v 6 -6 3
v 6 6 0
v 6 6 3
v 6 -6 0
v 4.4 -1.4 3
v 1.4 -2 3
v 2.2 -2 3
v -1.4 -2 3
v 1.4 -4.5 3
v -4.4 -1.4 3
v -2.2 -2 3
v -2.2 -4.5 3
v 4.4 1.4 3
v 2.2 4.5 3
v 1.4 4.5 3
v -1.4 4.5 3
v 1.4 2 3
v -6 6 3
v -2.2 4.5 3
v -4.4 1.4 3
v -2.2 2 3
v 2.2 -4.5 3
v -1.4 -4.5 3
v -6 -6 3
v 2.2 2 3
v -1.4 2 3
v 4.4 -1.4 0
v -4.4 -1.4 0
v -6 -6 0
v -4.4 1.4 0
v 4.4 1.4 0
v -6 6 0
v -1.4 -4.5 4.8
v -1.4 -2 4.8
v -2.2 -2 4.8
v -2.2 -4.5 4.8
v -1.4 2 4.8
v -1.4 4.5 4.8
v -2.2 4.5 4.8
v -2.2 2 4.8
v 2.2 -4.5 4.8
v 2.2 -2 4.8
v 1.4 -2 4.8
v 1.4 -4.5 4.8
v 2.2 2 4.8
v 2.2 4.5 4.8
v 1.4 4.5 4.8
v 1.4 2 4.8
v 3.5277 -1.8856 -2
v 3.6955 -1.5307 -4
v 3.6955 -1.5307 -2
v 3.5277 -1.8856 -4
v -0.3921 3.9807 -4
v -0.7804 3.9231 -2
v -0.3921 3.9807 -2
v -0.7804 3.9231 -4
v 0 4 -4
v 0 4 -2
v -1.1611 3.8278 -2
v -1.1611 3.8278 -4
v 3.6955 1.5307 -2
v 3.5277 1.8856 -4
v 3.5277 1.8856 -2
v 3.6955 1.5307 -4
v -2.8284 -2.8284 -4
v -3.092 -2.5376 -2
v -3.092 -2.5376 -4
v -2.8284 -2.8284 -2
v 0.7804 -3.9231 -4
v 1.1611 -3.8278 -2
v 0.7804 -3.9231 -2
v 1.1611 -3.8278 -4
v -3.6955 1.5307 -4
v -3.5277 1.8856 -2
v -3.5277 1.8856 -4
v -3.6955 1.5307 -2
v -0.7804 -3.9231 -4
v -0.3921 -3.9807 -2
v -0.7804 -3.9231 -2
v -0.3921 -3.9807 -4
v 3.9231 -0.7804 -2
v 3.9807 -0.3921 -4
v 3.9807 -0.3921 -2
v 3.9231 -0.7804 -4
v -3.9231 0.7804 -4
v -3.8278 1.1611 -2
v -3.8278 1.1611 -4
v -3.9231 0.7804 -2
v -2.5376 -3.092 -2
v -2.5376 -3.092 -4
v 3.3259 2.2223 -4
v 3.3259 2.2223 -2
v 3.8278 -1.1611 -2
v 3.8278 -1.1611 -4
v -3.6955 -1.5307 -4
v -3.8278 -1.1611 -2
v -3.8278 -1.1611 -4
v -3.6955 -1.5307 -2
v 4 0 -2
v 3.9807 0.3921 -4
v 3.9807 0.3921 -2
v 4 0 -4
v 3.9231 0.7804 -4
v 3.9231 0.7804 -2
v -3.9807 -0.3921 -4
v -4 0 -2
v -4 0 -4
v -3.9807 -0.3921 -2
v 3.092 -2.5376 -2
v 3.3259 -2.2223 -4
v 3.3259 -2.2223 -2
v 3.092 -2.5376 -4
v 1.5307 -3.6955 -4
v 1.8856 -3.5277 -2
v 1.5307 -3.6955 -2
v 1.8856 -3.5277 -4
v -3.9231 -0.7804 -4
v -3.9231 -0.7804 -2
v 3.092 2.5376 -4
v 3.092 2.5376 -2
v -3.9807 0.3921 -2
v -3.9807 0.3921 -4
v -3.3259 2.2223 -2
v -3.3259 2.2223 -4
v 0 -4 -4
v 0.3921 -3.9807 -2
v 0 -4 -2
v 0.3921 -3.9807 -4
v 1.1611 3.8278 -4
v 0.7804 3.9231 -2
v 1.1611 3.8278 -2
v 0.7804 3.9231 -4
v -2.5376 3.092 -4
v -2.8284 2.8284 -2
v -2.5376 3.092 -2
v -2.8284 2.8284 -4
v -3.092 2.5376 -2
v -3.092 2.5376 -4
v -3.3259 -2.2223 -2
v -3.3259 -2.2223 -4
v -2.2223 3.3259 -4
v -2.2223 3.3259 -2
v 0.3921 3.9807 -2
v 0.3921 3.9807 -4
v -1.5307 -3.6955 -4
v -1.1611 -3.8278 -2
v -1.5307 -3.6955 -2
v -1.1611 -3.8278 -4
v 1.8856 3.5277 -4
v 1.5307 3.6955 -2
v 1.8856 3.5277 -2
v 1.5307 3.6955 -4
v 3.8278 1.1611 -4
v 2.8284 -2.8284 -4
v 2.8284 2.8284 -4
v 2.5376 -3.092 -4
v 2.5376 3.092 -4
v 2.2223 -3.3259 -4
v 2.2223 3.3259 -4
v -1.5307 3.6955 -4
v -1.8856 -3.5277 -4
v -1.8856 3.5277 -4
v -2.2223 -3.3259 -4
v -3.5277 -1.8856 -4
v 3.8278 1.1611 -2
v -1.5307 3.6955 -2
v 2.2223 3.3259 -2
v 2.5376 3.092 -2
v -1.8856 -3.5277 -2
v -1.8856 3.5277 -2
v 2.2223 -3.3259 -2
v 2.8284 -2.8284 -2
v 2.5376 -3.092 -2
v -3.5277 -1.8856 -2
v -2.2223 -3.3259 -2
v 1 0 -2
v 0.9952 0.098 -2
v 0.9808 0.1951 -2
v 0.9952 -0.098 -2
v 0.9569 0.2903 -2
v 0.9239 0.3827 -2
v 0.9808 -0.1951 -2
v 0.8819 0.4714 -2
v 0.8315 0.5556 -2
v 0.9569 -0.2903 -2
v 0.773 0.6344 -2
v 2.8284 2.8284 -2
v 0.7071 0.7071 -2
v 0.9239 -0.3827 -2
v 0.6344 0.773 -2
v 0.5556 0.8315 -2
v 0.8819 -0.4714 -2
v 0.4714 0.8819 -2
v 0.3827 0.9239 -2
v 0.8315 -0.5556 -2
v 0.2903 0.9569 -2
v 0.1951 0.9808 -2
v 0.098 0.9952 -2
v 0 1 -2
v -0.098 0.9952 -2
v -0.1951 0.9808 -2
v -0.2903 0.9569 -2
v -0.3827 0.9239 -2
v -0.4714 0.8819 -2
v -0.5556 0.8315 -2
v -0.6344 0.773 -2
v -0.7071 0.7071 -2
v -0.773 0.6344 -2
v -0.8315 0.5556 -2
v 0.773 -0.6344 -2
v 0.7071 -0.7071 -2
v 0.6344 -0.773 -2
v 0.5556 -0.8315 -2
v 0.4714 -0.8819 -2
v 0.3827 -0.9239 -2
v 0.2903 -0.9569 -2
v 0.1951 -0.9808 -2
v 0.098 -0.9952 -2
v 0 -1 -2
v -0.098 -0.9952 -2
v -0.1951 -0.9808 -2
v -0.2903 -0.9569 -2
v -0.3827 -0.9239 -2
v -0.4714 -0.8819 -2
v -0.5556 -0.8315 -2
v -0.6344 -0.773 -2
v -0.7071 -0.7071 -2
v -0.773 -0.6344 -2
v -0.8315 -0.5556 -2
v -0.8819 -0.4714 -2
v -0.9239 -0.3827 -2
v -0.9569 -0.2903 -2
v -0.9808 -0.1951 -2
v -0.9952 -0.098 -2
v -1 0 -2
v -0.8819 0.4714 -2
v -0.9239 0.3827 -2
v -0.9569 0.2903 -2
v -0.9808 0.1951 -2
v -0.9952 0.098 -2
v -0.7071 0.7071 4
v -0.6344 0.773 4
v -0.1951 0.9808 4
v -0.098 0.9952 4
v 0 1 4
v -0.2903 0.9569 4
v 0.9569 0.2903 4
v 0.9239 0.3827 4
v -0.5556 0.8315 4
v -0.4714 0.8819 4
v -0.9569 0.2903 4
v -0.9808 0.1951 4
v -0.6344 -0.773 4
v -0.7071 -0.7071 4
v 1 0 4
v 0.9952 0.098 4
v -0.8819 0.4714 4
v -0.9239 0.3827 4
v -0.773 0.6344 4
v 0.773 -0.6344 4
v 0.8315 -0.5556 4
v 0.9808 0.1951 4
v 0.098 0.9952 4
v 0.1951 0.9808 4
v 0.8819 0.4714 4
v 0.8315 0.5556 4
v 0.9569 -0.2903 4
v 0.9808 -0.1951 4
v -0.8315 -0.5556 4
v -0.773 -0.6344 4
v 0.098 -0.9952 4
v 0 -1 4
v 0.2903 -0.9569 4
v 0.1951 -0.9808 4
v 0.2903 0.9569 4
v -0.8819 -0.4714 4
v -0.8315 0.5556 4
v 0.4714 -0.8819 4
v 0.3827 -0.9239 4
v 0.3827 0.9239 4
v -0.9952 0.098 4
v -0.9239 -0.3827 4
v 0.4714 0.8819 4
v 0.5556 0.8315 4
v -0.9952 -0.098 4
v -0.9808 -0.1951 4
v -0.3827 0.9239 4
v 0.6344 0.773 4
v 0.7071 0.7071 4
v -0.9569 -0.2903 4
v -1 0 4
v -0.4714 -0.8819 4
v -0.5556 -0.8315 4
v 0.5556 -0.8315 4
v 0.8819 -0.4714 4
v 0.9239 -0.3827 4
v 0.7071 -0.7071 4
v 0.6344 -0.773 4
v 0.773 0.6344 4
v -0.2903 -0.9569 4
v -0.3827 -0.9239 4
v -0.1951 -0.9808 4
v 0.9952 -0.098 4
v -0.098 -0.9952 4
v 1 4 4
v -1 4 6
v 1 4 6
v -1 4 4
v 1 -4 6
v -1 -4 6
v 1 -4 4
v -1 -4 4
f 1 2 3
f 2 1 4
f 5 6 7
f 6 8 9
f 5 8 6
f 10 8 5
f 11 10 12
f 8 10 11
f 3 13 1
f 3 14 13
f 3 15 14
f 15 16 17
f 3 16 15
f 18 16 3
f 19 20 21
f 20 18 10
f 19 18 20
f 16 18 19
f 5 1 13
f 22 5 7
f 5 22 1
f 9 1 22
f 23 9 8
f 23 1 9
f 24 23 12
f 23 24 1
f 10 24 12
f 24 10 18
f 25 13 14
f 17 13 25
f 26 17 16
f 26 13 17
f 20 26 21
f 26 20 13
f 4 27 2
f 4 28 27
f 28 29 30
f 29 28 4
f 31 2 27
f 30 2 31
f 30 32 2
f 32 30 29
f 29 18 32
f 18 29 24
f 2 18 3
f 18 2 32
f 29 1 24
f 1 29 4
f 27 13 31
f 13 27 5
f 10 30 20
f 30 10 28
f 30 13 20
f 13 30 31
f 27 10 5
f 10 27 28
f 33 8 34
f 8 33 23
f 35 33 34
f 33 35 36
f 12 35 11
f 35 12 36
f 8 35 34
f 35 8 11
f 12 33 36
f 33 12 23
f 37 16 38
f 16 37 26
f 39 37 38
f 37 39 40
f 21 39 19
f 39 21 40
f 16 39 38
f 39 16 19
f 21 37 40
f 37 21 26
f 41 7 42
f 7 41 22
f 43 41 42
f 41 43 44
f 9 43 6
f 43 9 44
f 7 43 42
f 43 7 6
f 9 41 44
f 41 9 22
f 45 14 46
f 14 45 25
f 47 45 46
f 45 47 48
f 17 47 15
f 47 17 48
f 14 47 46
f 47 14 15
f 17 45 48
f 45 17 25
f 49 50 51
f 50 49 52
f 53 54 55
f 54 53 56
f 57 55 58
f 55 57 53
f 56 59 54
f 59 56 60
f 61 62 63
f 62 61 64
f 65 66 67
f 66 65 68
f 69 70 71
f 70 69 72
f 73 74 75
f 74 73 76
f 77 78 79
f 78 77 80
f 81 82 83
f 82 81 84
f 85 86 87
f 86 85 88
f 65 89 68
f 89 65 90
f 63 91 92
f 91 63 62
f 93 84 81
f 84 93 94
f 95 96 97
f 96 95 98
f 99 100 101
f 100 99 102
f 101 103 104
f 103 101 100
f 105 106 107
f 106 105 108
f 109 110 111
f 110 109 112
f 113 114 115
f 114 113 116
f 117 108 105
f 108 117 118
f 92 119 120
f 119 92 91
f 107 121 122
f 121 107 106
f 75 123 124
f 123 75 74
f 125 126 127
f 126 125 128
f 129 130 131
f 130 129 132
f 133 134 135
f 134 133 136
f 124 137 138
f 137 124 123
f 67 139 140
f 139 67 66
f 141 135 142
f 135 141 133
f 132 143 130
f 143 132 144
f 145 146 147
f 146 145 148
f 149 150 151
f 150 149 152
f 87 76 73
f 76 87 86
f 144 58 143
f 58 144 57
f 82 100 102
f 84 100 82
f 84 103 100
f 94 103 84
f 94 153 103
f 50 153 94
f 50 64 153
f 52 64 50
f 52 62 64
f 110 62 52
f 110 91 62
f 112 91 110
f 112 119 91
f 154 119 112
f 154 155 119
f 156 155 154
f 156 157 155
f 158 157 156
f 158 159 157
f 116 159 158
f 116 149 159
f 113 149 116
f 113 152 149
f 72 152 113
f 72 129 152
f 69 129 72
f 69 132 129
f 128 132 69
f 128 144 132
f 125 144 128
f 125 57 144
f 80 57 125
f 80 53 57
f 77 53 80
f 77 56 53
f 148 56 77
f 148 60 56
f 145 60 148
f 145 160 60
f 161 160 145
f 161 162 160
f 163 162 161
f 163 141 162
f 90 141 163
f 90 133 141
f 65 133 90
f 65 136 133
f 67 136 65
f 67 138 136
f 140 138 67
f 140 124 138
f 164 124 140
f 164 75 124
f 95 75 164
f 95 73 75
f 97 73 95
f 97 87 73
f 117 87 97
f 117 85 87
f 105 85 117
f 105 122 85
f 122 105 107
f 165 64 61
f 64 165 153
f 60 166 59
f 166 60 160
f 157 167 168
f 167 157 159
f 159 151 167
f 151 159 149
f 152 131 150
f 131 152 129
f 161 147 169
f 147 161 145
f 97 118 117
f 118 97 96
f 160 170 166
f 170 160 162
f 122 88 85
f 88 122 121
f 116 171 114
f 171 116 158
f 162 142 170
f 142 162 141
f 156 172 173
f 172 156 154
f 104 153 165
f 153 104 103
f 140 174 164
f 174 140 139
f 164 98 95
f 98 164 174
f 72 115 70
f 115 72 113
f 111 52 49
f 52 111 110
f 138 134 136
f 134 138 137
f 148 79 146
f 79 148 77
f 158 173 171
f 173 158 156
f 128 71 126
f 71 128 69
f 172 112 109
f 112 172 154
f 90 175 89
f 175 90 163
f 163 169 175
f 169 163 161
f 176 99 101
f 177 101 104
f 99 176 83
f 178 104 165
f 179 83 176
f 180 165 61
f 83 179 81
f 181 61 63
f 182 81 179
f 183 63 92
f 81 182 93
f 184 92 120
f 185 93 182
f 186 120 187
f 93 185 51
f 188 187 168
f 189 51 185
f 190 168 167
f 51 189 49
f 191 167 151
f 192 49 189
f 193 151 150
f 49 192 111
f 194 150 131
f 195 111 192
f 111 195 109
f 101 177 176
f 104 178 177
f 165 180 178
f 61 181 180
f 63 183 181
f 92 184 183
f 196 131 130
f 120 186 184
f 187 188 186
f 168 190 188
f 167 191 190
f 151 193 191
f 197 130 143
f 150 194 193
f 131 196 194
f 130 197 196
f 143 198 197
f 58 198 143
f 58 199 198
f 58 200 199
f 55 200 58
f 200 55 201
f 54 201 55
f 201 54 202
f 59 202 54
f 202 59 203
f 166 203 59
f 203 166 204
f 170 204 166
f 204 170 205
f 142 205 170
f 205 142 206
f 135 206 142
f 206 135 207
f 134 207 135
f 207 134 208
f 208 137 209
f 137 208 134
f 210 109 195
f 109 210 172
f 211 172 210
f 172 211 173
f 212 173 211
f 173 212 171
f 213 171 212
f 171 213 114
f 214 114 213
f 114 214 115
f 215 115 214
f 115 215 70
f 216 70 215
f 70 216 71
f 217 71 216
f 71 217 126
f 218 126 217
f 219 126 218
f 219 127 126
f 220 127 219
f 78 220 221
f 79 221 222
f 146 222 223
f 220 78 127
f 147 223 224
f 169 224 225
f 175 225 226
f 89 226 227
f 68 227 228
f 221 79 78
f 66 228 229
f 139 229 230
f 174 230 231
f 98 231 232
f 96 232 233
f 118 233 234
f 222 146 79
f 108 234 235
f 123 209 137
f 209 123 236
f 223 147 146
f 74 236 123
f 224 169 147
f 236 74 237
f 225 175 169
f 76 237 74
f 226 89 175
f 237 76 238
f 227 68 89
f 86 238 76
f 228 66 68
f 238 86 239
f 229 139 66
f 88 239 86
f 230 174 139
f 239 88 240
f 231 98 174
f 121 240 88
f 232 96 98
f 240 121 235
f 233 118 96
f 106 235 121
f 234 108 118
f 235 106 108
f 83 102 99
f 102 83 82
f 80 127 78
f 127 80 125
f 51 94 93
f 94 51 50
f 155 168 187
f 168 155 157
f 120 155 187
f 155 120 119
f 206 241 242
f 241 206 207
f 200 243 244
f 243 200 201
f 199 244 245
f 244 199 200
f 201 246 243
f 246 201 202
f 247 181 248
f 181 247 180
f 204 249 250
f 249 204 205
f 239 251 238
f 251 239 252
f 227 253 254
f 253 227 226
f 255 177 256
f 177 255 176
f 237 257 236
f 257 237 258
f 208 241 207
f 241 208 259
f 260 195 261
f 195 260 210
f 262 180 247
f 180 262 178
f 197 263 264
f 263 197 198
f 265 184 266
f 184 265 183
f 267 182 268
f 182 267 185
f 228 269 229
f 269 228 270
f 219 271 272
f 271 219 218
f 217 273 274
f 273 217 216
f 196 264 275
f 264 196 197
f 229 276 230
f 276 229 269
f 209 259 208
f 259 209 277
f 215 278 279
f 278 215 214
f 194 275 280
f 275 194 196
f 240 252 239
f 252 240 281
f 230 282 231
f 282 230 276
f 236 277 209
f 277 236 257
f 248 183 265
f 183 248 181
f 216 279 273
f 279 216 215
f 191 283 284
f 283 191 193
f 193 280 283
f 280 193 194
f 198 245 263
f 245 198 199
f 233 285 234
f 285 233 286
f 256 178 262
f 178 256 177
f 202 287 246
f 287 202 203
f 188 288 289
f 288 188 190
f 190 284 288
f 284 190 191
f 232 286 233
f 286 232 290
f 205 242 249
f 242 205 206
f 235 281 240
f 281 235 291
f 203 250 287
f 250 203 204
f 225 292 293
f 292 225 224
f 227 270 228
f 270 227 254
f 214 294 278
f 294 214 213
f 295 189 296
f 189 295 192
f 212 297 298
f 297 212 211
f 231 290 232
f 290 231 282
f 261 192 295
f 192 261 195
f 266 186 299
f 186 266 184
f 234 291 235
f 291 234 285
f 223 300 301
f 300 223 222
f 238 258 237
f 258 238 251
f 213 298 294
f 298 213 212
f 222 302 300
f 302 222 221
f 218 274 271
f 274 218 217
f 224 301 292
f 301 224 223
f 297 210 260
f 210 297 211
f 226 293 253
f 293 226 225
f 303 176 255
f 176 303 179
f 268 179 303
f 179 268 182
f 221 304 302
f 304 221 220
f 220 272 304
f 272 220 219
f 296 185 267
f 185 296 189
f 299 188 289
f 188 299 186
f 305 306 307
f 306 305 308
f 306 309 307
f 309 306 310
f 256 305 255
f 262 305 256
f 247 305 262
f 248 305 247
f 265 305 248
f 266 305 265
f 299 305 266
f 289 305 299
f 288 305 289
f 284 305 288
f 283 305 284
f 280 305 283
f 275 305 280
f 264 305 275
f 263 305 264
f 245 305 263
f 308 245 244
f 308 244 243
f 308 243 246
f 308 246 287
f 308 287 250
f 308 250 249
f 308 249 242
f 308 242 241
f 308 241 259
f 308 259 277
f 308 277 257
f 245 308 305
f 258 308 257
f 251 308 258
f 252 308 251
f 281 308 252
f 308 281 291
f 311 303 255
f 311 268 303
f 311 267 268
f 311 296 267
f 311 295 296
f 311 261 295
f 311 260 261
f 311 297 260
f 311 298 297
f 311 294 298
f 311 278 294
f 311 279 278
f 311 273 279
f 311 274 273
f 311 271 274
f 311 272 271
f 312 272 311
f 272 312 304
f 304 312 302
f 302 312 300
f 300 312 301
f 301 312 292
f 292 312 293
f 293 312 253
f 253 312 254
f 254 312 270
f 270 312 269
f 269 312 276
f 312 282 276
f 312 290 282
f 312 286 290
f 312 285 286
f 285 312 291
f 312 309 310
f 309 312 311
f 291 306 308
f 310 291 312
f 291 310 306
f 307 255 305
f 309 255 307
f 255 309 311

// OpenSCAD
// Original two-piece rigid quarter-turn capture experiment, mm.
// Raised side stops require an axial lift before unlocking rotation.
// No spring preload, strength, manufacturing fit or physical stability claim.
agentscad_part = "all";
agentscad_pose = false;
lock_angle = 90;
$fn = 64;
module sleeve_local() {
  union() {
  difference() {
    translate([-6,-6,0]) cube([12,12,3]);
    translate([-4.4,-1.4,-0.1]) cube([8.8,2.8,3.2]);
  }
  for (x=[-2.2,1.4]) for (y=[-4.5,2]) translate([x,y,2.9]) cube([0.8,2.5,1.9]);
  }
}
module pin_local() {
  union() {
    translate([0,0,-4]) cylinder(r=4,h=2);
    translate([0,0,-2.1]) cylinder(r=1,h=6.2);
    translate([-4,-1,4]) cube([8,2,2]);
  }
}
if (agentscad_part == "sleeve") sleeve_local();
if (agentscad_part == "pin") rotate([0,0,agentscad_pose ? lock_angle : 0]) pin_local();
if (agentscad_part == "all") { sleeve_local(); rotate([0,0,lock_angle]) pin_local(); }

/* AGENTSCAD_ASSEMBLY_V1
{
  "schemaVersion": 1,
  "units": "mm",
  "coordinateSystem": "right-handed",
  "parts": [
    {
      "id": "sleeve",
      "name": "sleeve",
      "selector": "sleeve",
      "source": "generated",
      "material": null
    },
    {
      "id": "pin",
      "name": "pin",
      "selector": "pin",
      "source": "generated",
      "material": null
    }
  ],
  "instances": [
    {
      "id": "sleeve",
      "partId": "sleeve",
      "subassemblyId": null,
      "transform": [
        1,
        0,
        0,
        0,
        0,
        1,
        0,
        0,
        0,
        0,
        1,
        0,
        0,
        0,
        0,
        1
      ]
    },
    {
      "id": "pin",
      "partId": "pin",
      "subassemblyId": null,
      "transform": [
        6.123233995736766e-17,
        -1.0,
        0,
        0,
        1.0,
        6.123233995736766e-17,
        0,
        0,
        0,
        0,
        1,
        0,
        0,
        0,
        0,
        1
      ]
    }
  ],
  "subassemblies": [],
  "connections": [
    {
      "id": "capture",
      "type": "other",
      "a": "sleeve",
      "b": "pin",
      "frameA": {
        "origin": [
          0,
          0,
          0
        ],
        "direction": [
          0,
          0,
          1
        ]
      },
      "frameB": {
        "origin": [
          0,
          0,
          0
        ],
        "direction": [
          0,
          0,
          1
        ]
      },
      "range": null,
      "pitchMm": null,
      "ratio": null,
      "allowedContact": []
    }
  ],
  "groundedInstanceId": "sleeve",
  "motions": [],
  "operations": [
    {
      "id": "release_pin",
      "action": "disassemble",
      "instanceId": "pin",
      "waypoints": [
        [
          6.123233995736766e-17,
          -1.0,
          0,
          0,
          1.0,
          6.123233995736766e-17,
          0,
          0,
          0,
          0,
          1,
          0.0,
          0,
          0,
          0,
          1
        ],
        [
          6.123233995736766e-17,
          -1.0,
          0,
          0,
          1.0,
          6.123233995736766e-17,
          0,
          0,
          0,
          0,
          1,
          0.1,
          0,
          0,
          0,
          1
        ],
        [
          6.123233995736766e-17,
          -1.0,
          0,
          0,
          1.0,
          6.123233995736766e-17,
          0,
          0,
          0,
          0,
          1,
          0.2,
          0,
          0,
          0,
          1
        ],
        [
          6.123233995736766e-17,
          -1.0,
          0,
          0,
          1.0,
          6.123233995736766e-17,
          0,
          0,
          0,
          0,
          1,
          0.3,
          0,
          0,
          0,
          1
        ],
        [
          6.123233995736766e-17,
          -1.0,
          0,
          0,
          1.0,
          6.123233995736766e-17,
          0,
          0,
          0,
          0,
          1,
          0.4,
          0,
          0,
          0,
          1
        ],
        [
          6.123233995736766e-17,
          -1.0,
          0,
          0,
          1.0,
          6.123233995736766e-17,
          0,
          0,
          0,
          0,
          1,
          0.5,
          0,
          0,
          0,
          1
        ],
        [
          6.123233995736766e-17,
          -1.0,
          0,
          0,
          1.0,
          6.123233995736766e-17,
          0,
          0,
          0,
          0,
          1,
          0.6,
          0,
          0,
          0,
          1
        ],
        [
          6.123233995736766e-17,
          -1.0,
          0,
          0,
          1.0,
          6.123233995736766e-17,
          0,
          0,
          0,
          0,
          1,
          0.7,
          0,
          0,
          0,
          1
        ],
        [
          6.123233995736766e-17,
          -1.0,
          0,
          0,
          1.0,
          6.123233995736766e-17,
          0,
          0,
          0,
          0,
          1,
          0.8,
          0,
          0,
          0,
          1
        ],
        [
          6.123233995736766e-17,
          -1.0,
          0,
          0,
          1.0,
          6.123233995736766e-17,
          0,
          0,
          0,
          0,
          1,
          0.9,
          0,
          0,
          0,
          1
        ],
        [
          6.123233995736766e-17,
          -1.0,
          0,
          0,
          1.0,
          6.123233995736766e-17,
          0,
          0,
          0,
          0,
          1,
          1,
          0,
          0,
          0,
          1
        ],
        [
          0.08715574274765814,
          -0.9961946980917455,
          0,
          0,
          0.9961946980917455,
          0.08715574274765814,
          0,
          0,
          0,
          0,
          1,
          1,
          0,
          0,
          0,
          1
        ],
        [
          0.17364817766693041,
          -0.984807753012208,
          0,
          0,
          0.984807753012208,
          0.17364817766693041,
          0,
          0,
          0,
          0,
          1,
          1,
          0,
          0,
          0,
          1
        ],
        [
          0.25881904510252074,
          -0.9659258262890683,
          0,
          0,
          0.9659258262890683,
          0.25881904510252074,
          0,
          0,
          0,
          0,
          1,
          1,
          0,
          0,
          0,
          1
        ],
        [
          0.3420201433256688,
          -0.9396926207859083,
          0,
          0,
          0.9396926207859083,
          0.3420201433256688,
          0,
          0,
          0,
          0,
          1,
          1,
          0,
          0,
          0,
          1
        ],
        [
          0.42261826174069944,
          -0.9063077870366499,
          0,
          0,
          0.9063077870366499,
          0.42261826174069944,
          0,
          0,
          0,
          0,
          1,
          1,
          0,
          0,
          0,
          1
        ],
        [
          0.5000000000000001,
          -0.8660254037844386,
          0,
          0,
          0.8660254037844386,
          0.5000000000000001,
          0,
          0,
          0,
          0,
          1,
          1,
          0,
          0,
          0,
          1
        ],
        [
          0.573576436351046,
          -0.8191520442889918,
          0,
          0,
          0.8191520442889918,
          0.573576436351046,
          0,
          0,
          0,
          0,
          1,
          1,
          0,
          0,
          0,
          1
        ],
        [
          0.6427876096865394,
          -0.766044443118978,
          0,
          0,
          0.766044443118978,
          0.6427876096865394,
          0,
          0,
          0,
          0,
          1,
          1,
          0,
          0,
          0,
          1
        ],
        [
          0.7071067811865476,
          -0.7071067811865475,
          0,
          0,
          0.7071067811865475,
          0.7071067811865476,
          0,
          0,
          0,
          0,
          1,
          1,
          0,
          0,
          0,
          1
        ],
        [
          0.766044443118978,
          -0.6427876096865393,
          0,
          0,
          0.6427876096865393,
          0.766044443118978,
          0,
          0,
          0,
          0,
          1,
          1,
          0,
          0,
          0,
          1
        ],
        [
          0.8191520442889918,
          -0.573576436351046,
          0,
          0,
          0.573576436351046,
          0.8191520442889918,
          0,
          0,
          0,
          0,
          1,
          1,
          0,
          0,
          0,
          1
        ],
        [
          0.8660254037844387,
          -0.49999999999999994,
          0,
          0,
          0.49999999999999994,
          0.8660254037844387,
          0,
          0,
          0,
          0,
          1,
          1,
          0,
          0,
          0,
          1
        ],
        [
          0.9063077870366499,
          -0.42261826174069944,
          0,
          0,
          0.42261826174069944,
          0.9063077870366499,
          0,
          0,
          0,
          0,
          1,
          1,
          0,
          0,
          0,
          1
        ],
        [
          0.9396926207859084,
          -0.3420201433256687,
          0,
          0,
          0.3420201433256687,
          0.9396926207859084,
          0,
          0,
          0,
          0,
          1,
          1,
          0,
          0,
          0,
          1
        ],
        [
          0.9659258262890683,
          -0.25881904510252074,
          0,
          0,
          0.25881904510252074,
          0.9659258262890683,
          0,
          0,
          0,
          0,
          1,
          1,
          0,
          0,
          0,
          1
        ],
        [
          0.984807753012208,
          -0.17364817766693033,
          0,
          0,
          0.17364817766693033,
          0.984807753012208,
          0,
          0,
          0,
          0,
          1,
          1,
          0,
          0,
          0,
          1
        ],
        [
          0.9961946980917455,
          -0.08715574274765817,
          0,
          0,
          0.08715574274765817,
          0.9961946980917455,
          0,
          0,
          0,
          0,
          1,
          1,
          0,
          0,
          0,
          1
        ],
        [
          1.0,
          -0.0,
          0,
          0,
          0.0,
          1.0,
          0,
          0,
          0,
          0,
          1,
          1,
          0,
          0,
          0,
          1
        ],
        [
          1.0,
          -0.0,
          0,
          0,
          0.0,
          1.0,
          0,
          0,
          0,
          0,
          1,
          0.8505747126436781,
          0,
          0,
          0,
          1
        ],
        [
          1.0,
          -0.0,
          0,
          0,
          0.0,
          1.0,
          0,
          0,
          0,
          0,
          1,
          0.7011494252873562,
          0,
          0,
          0,
          1
        ],
        [
          1.0,
          -0.0,
          0,
          0,
          0.0,
          1.0,
          0,
          0,
          0,
          0,
          1,
          0.5517241379310345,
          0,
          0,
          0,
          1
        ],
        [
          1.0,
          -0.0,
          0,
          0,
          0.0,
          1.0,
          0,
          0,
          0,
          0,
          1,
          0.4022988505747126,
          0,
          0,
          0,
          1
        ],
        [
          1.0,
          -0.0,
          0,
          0,
          0.0,
          1.0,
          0,
          0,
          0,
          0,
          1,
          0.25287356321839083,
          0,
          0,
          0,
          1
        ],
        [
          1.0,
          -0.0,
          0,
          0,
          0.0,
          1.0,
          0,
          0,
          0,
          0,
          1,
          0.10344827586206895,
          0,
          0,
          0,
          1
        ],
        [
          1.0,
          -0.0,
          0,
          0,
          0.0,
          1.0,
          0,
          0,
          0,
          0,
          1,
          -0.04597701149425282,
          0,
          0,
          0,
          1
        ],
        [
          1.0,
          -0.0,
          0,
          0,
          0.0,
          1.0,
          0,
          0,
          0,
          0,
          1,
          -0.1954022988505748,
          0,
          0,
          0,
          1
        ],
        [
          1.0,
          -0.0,
          0,
          0,
          0.0,
          1.0,
          0,
          0,
          0,
          0,
          1,
          -0.3448275862068966,
          0,
          0,
          0,
          1
        ],
        [
          1.0,
          -0.0,
          0,
          0,
          0.0,
          1.0,
          0,
          0,
          0,
          0,
          1,
          -0.49425287356321834,
          0,
          0,
          0,
          1
        ],
        [
          1.0,
          -0.0,
          0,
          0,
          0.0,
          1.0,
          0,
          0,
          0,
          0,
          1,
          -0.6436781609195403,
          0,
          0,
          0,
          1
        ],
        [
          1.0,
          -0.0,
          0,
          0,
          0.0,
          1.0,
          0,
          0,
          0,
          0,
          1,
          -0.7931034482758621,
          0,
          0,
          0,
          1
        ],
        [
          1.0,
          -0.0,
          0,
          0,
          0.0,
          1.0,
          0,
          0,
          0,
          0,
          1,
          -0.9425287356321839,
          0,
          0,
          0,
          1
        ],
        [
          1.0,
          -0.0,
          0,
          0,
          0.0,
          1.0,
          0,
          0,
          0,
          0,
          1,
          -1.0919540229885056,
          0,
          0,
          0,
          1
        ],
        [
          1.0,
          -0.0,
          0,
          0,
          0.0,
          1.0,
          0,
          0,
          0,
          0,
          1,
          -1.2413793103448274,
          0,
          0,
          0,
          1
        ],
        [
          1.0,
          -0.0,
          0,
          0,
          0.0,
          1.0,
          0,
          0,
          0,
          0,
          1,
          -1.3908045977011496,
          0,
          0,
          0,
          1
        ],
        [
          1.0,
          -0.0,
          0,
          0,
          0.0,
          1.0,
          0,
          0,
          0,
          0,
          1,
          -1.5402298850574714,
          0,
          0,
          0,
          1
        ],
        [
          1.0,
          -0.0,
          0,
          0,
          0.0,
          1.0,
          0,
          0,
          0,
          0,
          1,
          -1.6896551724137931,
          0,
          0,
          0,
          1
        ],
        [
          1.0,
          -0.0,
          0,
          0,
          0.0,
          1.0,
          0,
          0,
          0,
          0,
          1,
          -1.839080459770115,
          0,
          0,
          0,
          1
        ],
        [
          1.0,
          -0.0,
          0,
          0,
          0.0,
          1.0,
          0,
          0,
          0,
          0,
          1,
          -1.9885057471264367,
          0,
          0,
          0,
          1
        ],
        [
          1.0,
          -0.0,
          0,
          0,
          0.0,
          1.0,
          0,
          0,
          0,
          0,
          1,
          -2.1379310344827585,
          0,
          0,
          0,
          1
        ],
        [
          1.0,
          -0.0,
          0,
          0,
          0.0,
          1.0,
          0,
          0,
          0,
          0,
          1,
          -2.2873563218390807,
          0,
          0,
          0,
          1
        ],
        [
          1.0,
          -0.0,
          0,
          0,
          0.0,
          1.0,
          0,
          0,
          0,
          0,
          1,
          -2.4367816091954024,
          0,
          0,
          0,
          1
        ],
        [
          1.0,
          -0.0,
          0,
          0,
          0.0,
          1.0,
          0,
          0,
          0,
          0,
          1,
          -2.586206896551724,
          0,
          0,
          0,
          1
        ],
        [
          1.0,
          -0.0,
          0,
          0,
          0.0,
          1.0,
          0,
          0,
          0,
          0,
          1,
          -2.735632183908046,
          0,
          0,
          0,
          1
        ],
        [
          1.0,
          -0.0,
          0,
          0,
          0.0,
          1.0,
          0,
          0,
          0,
          0,
          1,
          -2.8850574712643677,
          0,
          0,
          0,
          1
        ],
        [
          1.0,
          -0.0,
          0,
          0,
          0.0,
          1.0,
          0,
          0,
          0,
          0,
          1,
          -3.0344827586206895,
          0,
          0,
          0,
          1
        ],
        [
          1.0,
          -0.0,
          0,
          0,
          0.0,
          1.0,
          0,
          0,
          0,
          0,
          1,
          -3.1839080459770113,
          0,
          0,
          0,
          1
        ],
        [
          1.0,
          -0.0,
          0,
          0,
          0.0,
          1.0,
          0,
          0,
          0,
          0,
          1,
          -3.333333333333333,
          0,
          0,
          0,
          1
        ],
        [
          1.0,
          -0.0,
          0,
          0,
          0.0,
          1.0,
          0,
          0,
          0,
          0,
          1,
          -3.482758620689655,
          0,
          0,
          0,
          1
        ],
        [
          1.0,
          -0.0,
          0,
          0,
          0.0,
          1.0,
          0,
          0,
          0,
          0,
          1,
          -3.6321839080459766,
          0,
          0,
          0,
          1
        ],
        [
          1.0,
          -0.0,
          0,
          0,
          0.0,
          1.0,
          0,
          0,
          0,
          0,
          1,
          -3.7816091954022992,
          0,
          0,
          0,
          1
        ],
        [
          1.0,
          -0.0,
          0,
          0,
          0.0,
          1.0,
          0,
          0,
          0,
          0,
          1,
          -3.931034482758621,
          0,
          0,
          0,
          1
        ],
        [
          1.0,
          -0.0,
          0,
          0,
          0.0,
          1.0,
          0,
          0,
          0,
          0,
          1,
          -4.080459770114943,
          0,
          0,
          0,
          1
        ],
        [
          1.0,
          -0.0,
          0,
          0,
          0.0,
          1.0,
          0,
          0,
          0,
          0,
          1,
          -4.2298850574712645,
          0,
          0,
          0,
          1
        ],
        [
          1.0,
          -0.0,
          0,
          0,
          0.0,
          1.0,
          0,
          0,
          0,
          0,
          1,
          -4.379310344827586,
          0,
          0,
          0,
          1
        ],
        [
          1.0,
          -0.0,
          0,
          0,
          0.0,
          1.0,
          0,
          0,
          0,
          0,
          1,
          -4.528735632183908,
          0,
          0,
          0,
          1
        ],
        [
          1.0,
          -0.0,
          0,
          0,
          0.0,
          1.0,
          0,
          0,
          0,
          0,
          1,
          -4.67816091954023,
          0,
          0,
          0,
          1
        ],
        [
          1.0,
          -0.0,
          0,
          0,
          0.0,
          1.0,
          0,
          0,
          0,
          0,
          1,
          -4.827586206896552,
          0,
          0,
          0,
          1
        ],
        [
          1.0,
          -0.0,
          0,
          0,
          0.0,
          1.0,
          0,
          0,
          0,
          0,
          1,
          -4.977011494252873,
          0,
          0,
          0,
          1
        ],
        [
          1.0,
          -0.0,
          0,
          0,
          0.0,
          1.0,
          0,
          0,
          0,
          0,
          1,
          -5.126436781609195,
          0,
          0,
          0,
          1
        ],
        [
          1.0,
          -0.0,
          0,
          0,
          0.0,
          1.0,
          0,
          0,
          0,
          0,
          1,
          -5.275862068965517,
          0,
          0,
          0,
          1
        ],
        [
          1.0,
          -0.0,
          0,
          0,
          0.0,
          1.0,
          0,
          0,
          0,
          0,
          1,
          -5.425287356321839,
          0,
          0,
          0,
          1
        ],
        [
          1.0,
          -0.0,
          0,
          0,
          0.0,
          1.0,
          0,
          0,
          0,
          0,
          1,
          -5.574712643678161,
          0,
          0,
          0,
          1
        ],
        [
          1.0,
          -0.0,
          0,
          0,
          0.0,
          1.0,
          0,
          0,
          0,
          0,
          1,
          -5.724137931034483,
          0,
          0,
          0,
          1
        ],
        [
          1.0,
          -0.0,
          0,
          0,
          0.0,
          1.0,
          0,
          0,
          0,
          0,
          1,
          -5.873563218390805,
          0,
          0,
          0,
          1
        ],
        [
          1.0,
          -0.0,
          0,
          0,
          0.0,
          1.0,
          0,
          0,
          0,
          0,
          1,
          -6.022988505747127,
          0,
          0,
          0,
          1
        ],
        [
          1.0,
          -0.0,
          0,
          0,
          0.0,
          1.0,
          0,
          0,
          0,
          0,
          1,
          -6.172413793103448,
          0,
          0,
          0,
          1
        ],
        [
          1.0,
          -0.0,
          0,
          0,
          0.0,
          1.0,
          0,
          0,
          0,
          0,
          1,
          -6.32183908045977,
          0,
          0,
          0,
          1
        ],
        [
          1.0,
          -0.0,
          0,
          0,
          0.0,
          1.0,
          0,
          0,
          0,
          0,
          1,
          -6.471264367816092,
          0,
          0,
          0,
          1
        ],
        [
          1.0,
          -0.0,
          0,
          0,
          0.0,
          1.0,
          0,
          0,
          0,
          0,
          1,
          -6.620689655172414,
          0,
          0,
          0,
          1
        ],
        [
          1.0,
          -0.0,
          0,
          0,
          0.0,
          1.0,
          0,
          0,
          0,
          0,
          1,
          -6.7701149425287355,
          0,
          0,
          0,
          1
        ],
        [
          1.0,
          -0.0,
          0,
          0,
          0.0,
          1.0,
          0,
          0,
          0,
          0,
          1,
          -6.919540229885057,
          0,
          0,
          0,
          1
        ],
        [
          1.0,
          -0.0,
          0,
          0,
          0.0,
          1.0,
          0,
          0,
          0,
          0,
          1,
          -7.068965517241379,
          0,
          0,
          0,
          1
        ],
        [
          1.0,
          -0.0,
          0,
          0,
          0.0,
          1.0,
          0,
          0,
          0,
          0,
          1,
          -7.218390804597702,
          0,
          0,
          0,
          1
        ],
        [
          1.0,
          -0.0,
          0,
          0,
          0.0,
          1.0,
          0,
          0,
          0,
          0,
          1,
          -7.3678160919540225,
          0,
          0,
          0,
          1
        ],
        [
          1.0,
          -0.0,
          0,
          0,
          0.0,
          1.0,
          0,
          0,
          0,
          0,
          1,
          -7.517241379310345,
          0,
          0,
          0,
          1
        ],
        [
          1.0,
          -0.0,
          0,
          0,
          0.0,
          1.0,
          0,
          0,
          0,
          0,
          1,
          -7.666666666666666,
          0,
          0,
          0,
          1
        ],
        [
          1.0,
          -0.0,
          0,
          0,
          0.0,
          1.0,
          0,
          0,
          0,
          0,
          1,
          -7.816091954022989,
          0,
          0,
          0,
          1
        ],
        [
          1.0,
          -0.0,
          0,
          0,
          0.0,
          1.0,
          0,
          0,
          0,
          0,
          1,
          -7.96551724137931,
          0,
          0,
          0,
          1
        ],
        [
          1.0,
          -0.0,
          0,
          0,
          0.0,
          1.0,
          0,
          0,
          0,
          0,
          1,
          -8.114942528735632,
          0,
          0,
          0,
          1
        ],
        [
          1.0,
          -0.0,
          0,
          0,
          0.0,
          1.0,
          0,
          0,
          0,
          0,
          1,
          -8.264367816091953,
          0,
          0,
          0,
          1
        ],
        [
          1.0,
          -0.0,
          0,
          0,
          0.0,
          1.0,
          0,
          0,
          0,
          0,
          1,
          -8.413793103448276,
          0,
          0,
          0,
          1
        ],
        [
          1.0,
          -0.0,
          0,
          0,
          0.0,
          1.0,
          0,
          0,
          0,
          0,
          1,
          -8.563218390804598,
          0,
          0,
          0,
          1
        ],
        [
          1.0,
          -0.0,
          0,
          0,
          0.0,
          1.0,
          0,
          0,
          0,
          0,
          1,
          -8.71264367816092,
          0,
          0,
          0,
          1
        ],
        [
          1.0,
          -0.0,
          0,
          0,
          0.0,
          1.0,
          0,
          0,
          0,
          0,
          1,
          -8.862068965517242,
          0,
          0,
          0,
          1
        ],
        [
          1.0,
          -0.0,
          0,
          0,
          0.0,
          1.0,
          0,
          0,
          0,
          0,
          1,
          -9.011494252873563,
          0,
          0,
          0,
          1
        ],
        [
          1.0,
          -0.0,
          0,
          0,
          0.0,
          1.0,
          0,
          0,
          0,
          0,
          1,
          -9.160919540229886,
          0,
          0,
          0,
          1
        ],
        [
          1.0,
          -0.0,
          0,
          0,
          0.0,
          1.0,
          0,
          0,
          0,
          0,
          1,
          -9.310344827586206,
          0,
          0,
          0,
          1
        ],
        [
          1.0,
          -0.0,
          0,
          0,
          0.0,
          1.0,
          0,
          0,
          0,
          0,
          1,
          -9.459770114942529,
          0,
          0,
          0,
          1
        ],
        [
          1.0,
          -0.0,
          0,
          0,
          0.0,
          1.0,
          0,
          0,
          0,
          0,
          1,
          -9.60919540229885,
          0,
          0,
          0,
          1
        ],
        [
          1.0,
          -0.0,
          0,
          0,
          0.0,
          1.0,
          0,
          0,
          0,
          0,
          1,
          -9.758620689655173,
          0,
          0,
          0,
          1
        ],
        [
          1.0,
          -0.0,
          0,
          0,
          0.0,
          1.0,
          0,
          0,
          0,
          0,
          1,
          -9.908045977011493,
          0,
          0,
          0,
          1
        ],
        [
          1.0,
          -0.0,
          0,
          0,
          0.0,
          1.0,
          0,
          0,
          0,
          0,
          1,
          -10.057471264367816,
          0,
          0,
          0,
          1
        ],
        [
          1.0,
          -0.0,
          0,
          0,
          0.0,
          1.0,
          0,
          0,
          0,
          0,
          1,
          -10.206896551724139,
          0,
          0,
          0,
          1
        ],
        [
          1.0,
          -0.0,
          0,
          0,
          0.0,
          1.0,
          0,
          0,
          0,
          0,
          1,
          -10.35632183908046,
          0,
          0,
          0,
          1
        ],
        [
          1.0,
          -0.0,
          0,
          0,
          0.0,
          1.0,
          0,
          0,
          0,
          0,
          1,
          -10.505747126436782,
          0,
          0,
          0,
          1
        ],
        [
          1.0,
          -0.0,
          0,
          0,
          0.0,
          1.0,
          0,
          0,
          0,
          0,
          1,
          -10.655172413793103,
          0,
          0,
          0,
          1
        ],
        [
          1.0,
          -0.0,
          0,
          0,
          0.0,
          1.0,
          0,
          0,
          0,
          0,
          1,
          -10.804597701149426,
          0,
          0,
          0,
          1
        ],
        [
          1.0,
          -0.0,
          0,
          0,
          0.0,
          1.0,
          0,
          0,
          0,
          0,
          1,
          -10.954022988505747,
          0,
          0,
          0,
          1
        ],
        [
          1.0,
          -0.0,
          0,
          0,
          0.0,
          1.0,
          0,
          0,
          0,
          0,
          1,
          -11.10344827586207,
          0,
          0,
          0,
          1
        ],
        [
          1.0,
          -0.0,
          0,
          0,
          0.0,
          1.0,
          0,
          0,
          0,
          0,
          1,
          -11.25287356321839,
          0,
          0,
          0,
          1
        ],
        [
          1.0,
          -0.0,
          0,
          0,
          0.0,
          1.0,
          0,
          0,
          0,
          0,
          1,
          -11.402298850574713,
          0,
          0,
          0,
          1
        ],
        [
          1.0,
          -0.0,
          0,
          0,
          0.0,
          1.0,
          0,
          0,
          0,
          0,
          1,
          -11.551724137931034,
          0,
          0,
          0,
          1
        ],
        [
          1.0,
          -0.0,
          0,
          0,
          0.0,
          1.0,
          0,
          0,
          0,
          0,
          1,
          -11.701149425287356,
          0,
          0,
          0,
          1
        ],
        [
          1.0,
          -0.0,
          0,
          0,
          0.0,
          1.0,
          0,
          0,
          0,
          0,
          1,
          -11.850574712643677,
          0,
          0,
          0,
          1
        ],
        [
          1.0,
          -0.0,
          0,
          0,
          0.0,
          1.0,
          0,
          0,
          0,
          0,
          1,
          -12.0,
          0,
          0,
          0,
          1
        ]
      ],
      "tools": []
    }
  ],
  "manufacturing": null,
  "assumptions": [
    "Operation waypoints are explicit sampled absolute poses, not sparse endpoints."
  ],
  "unknowns": [
    "No preload or vibration stability has been verified.",
    "Material, manufacturing tolerances and physical operation are unverified."
  ]
}
END_AGENTSCAD_ASSEMBLY */
